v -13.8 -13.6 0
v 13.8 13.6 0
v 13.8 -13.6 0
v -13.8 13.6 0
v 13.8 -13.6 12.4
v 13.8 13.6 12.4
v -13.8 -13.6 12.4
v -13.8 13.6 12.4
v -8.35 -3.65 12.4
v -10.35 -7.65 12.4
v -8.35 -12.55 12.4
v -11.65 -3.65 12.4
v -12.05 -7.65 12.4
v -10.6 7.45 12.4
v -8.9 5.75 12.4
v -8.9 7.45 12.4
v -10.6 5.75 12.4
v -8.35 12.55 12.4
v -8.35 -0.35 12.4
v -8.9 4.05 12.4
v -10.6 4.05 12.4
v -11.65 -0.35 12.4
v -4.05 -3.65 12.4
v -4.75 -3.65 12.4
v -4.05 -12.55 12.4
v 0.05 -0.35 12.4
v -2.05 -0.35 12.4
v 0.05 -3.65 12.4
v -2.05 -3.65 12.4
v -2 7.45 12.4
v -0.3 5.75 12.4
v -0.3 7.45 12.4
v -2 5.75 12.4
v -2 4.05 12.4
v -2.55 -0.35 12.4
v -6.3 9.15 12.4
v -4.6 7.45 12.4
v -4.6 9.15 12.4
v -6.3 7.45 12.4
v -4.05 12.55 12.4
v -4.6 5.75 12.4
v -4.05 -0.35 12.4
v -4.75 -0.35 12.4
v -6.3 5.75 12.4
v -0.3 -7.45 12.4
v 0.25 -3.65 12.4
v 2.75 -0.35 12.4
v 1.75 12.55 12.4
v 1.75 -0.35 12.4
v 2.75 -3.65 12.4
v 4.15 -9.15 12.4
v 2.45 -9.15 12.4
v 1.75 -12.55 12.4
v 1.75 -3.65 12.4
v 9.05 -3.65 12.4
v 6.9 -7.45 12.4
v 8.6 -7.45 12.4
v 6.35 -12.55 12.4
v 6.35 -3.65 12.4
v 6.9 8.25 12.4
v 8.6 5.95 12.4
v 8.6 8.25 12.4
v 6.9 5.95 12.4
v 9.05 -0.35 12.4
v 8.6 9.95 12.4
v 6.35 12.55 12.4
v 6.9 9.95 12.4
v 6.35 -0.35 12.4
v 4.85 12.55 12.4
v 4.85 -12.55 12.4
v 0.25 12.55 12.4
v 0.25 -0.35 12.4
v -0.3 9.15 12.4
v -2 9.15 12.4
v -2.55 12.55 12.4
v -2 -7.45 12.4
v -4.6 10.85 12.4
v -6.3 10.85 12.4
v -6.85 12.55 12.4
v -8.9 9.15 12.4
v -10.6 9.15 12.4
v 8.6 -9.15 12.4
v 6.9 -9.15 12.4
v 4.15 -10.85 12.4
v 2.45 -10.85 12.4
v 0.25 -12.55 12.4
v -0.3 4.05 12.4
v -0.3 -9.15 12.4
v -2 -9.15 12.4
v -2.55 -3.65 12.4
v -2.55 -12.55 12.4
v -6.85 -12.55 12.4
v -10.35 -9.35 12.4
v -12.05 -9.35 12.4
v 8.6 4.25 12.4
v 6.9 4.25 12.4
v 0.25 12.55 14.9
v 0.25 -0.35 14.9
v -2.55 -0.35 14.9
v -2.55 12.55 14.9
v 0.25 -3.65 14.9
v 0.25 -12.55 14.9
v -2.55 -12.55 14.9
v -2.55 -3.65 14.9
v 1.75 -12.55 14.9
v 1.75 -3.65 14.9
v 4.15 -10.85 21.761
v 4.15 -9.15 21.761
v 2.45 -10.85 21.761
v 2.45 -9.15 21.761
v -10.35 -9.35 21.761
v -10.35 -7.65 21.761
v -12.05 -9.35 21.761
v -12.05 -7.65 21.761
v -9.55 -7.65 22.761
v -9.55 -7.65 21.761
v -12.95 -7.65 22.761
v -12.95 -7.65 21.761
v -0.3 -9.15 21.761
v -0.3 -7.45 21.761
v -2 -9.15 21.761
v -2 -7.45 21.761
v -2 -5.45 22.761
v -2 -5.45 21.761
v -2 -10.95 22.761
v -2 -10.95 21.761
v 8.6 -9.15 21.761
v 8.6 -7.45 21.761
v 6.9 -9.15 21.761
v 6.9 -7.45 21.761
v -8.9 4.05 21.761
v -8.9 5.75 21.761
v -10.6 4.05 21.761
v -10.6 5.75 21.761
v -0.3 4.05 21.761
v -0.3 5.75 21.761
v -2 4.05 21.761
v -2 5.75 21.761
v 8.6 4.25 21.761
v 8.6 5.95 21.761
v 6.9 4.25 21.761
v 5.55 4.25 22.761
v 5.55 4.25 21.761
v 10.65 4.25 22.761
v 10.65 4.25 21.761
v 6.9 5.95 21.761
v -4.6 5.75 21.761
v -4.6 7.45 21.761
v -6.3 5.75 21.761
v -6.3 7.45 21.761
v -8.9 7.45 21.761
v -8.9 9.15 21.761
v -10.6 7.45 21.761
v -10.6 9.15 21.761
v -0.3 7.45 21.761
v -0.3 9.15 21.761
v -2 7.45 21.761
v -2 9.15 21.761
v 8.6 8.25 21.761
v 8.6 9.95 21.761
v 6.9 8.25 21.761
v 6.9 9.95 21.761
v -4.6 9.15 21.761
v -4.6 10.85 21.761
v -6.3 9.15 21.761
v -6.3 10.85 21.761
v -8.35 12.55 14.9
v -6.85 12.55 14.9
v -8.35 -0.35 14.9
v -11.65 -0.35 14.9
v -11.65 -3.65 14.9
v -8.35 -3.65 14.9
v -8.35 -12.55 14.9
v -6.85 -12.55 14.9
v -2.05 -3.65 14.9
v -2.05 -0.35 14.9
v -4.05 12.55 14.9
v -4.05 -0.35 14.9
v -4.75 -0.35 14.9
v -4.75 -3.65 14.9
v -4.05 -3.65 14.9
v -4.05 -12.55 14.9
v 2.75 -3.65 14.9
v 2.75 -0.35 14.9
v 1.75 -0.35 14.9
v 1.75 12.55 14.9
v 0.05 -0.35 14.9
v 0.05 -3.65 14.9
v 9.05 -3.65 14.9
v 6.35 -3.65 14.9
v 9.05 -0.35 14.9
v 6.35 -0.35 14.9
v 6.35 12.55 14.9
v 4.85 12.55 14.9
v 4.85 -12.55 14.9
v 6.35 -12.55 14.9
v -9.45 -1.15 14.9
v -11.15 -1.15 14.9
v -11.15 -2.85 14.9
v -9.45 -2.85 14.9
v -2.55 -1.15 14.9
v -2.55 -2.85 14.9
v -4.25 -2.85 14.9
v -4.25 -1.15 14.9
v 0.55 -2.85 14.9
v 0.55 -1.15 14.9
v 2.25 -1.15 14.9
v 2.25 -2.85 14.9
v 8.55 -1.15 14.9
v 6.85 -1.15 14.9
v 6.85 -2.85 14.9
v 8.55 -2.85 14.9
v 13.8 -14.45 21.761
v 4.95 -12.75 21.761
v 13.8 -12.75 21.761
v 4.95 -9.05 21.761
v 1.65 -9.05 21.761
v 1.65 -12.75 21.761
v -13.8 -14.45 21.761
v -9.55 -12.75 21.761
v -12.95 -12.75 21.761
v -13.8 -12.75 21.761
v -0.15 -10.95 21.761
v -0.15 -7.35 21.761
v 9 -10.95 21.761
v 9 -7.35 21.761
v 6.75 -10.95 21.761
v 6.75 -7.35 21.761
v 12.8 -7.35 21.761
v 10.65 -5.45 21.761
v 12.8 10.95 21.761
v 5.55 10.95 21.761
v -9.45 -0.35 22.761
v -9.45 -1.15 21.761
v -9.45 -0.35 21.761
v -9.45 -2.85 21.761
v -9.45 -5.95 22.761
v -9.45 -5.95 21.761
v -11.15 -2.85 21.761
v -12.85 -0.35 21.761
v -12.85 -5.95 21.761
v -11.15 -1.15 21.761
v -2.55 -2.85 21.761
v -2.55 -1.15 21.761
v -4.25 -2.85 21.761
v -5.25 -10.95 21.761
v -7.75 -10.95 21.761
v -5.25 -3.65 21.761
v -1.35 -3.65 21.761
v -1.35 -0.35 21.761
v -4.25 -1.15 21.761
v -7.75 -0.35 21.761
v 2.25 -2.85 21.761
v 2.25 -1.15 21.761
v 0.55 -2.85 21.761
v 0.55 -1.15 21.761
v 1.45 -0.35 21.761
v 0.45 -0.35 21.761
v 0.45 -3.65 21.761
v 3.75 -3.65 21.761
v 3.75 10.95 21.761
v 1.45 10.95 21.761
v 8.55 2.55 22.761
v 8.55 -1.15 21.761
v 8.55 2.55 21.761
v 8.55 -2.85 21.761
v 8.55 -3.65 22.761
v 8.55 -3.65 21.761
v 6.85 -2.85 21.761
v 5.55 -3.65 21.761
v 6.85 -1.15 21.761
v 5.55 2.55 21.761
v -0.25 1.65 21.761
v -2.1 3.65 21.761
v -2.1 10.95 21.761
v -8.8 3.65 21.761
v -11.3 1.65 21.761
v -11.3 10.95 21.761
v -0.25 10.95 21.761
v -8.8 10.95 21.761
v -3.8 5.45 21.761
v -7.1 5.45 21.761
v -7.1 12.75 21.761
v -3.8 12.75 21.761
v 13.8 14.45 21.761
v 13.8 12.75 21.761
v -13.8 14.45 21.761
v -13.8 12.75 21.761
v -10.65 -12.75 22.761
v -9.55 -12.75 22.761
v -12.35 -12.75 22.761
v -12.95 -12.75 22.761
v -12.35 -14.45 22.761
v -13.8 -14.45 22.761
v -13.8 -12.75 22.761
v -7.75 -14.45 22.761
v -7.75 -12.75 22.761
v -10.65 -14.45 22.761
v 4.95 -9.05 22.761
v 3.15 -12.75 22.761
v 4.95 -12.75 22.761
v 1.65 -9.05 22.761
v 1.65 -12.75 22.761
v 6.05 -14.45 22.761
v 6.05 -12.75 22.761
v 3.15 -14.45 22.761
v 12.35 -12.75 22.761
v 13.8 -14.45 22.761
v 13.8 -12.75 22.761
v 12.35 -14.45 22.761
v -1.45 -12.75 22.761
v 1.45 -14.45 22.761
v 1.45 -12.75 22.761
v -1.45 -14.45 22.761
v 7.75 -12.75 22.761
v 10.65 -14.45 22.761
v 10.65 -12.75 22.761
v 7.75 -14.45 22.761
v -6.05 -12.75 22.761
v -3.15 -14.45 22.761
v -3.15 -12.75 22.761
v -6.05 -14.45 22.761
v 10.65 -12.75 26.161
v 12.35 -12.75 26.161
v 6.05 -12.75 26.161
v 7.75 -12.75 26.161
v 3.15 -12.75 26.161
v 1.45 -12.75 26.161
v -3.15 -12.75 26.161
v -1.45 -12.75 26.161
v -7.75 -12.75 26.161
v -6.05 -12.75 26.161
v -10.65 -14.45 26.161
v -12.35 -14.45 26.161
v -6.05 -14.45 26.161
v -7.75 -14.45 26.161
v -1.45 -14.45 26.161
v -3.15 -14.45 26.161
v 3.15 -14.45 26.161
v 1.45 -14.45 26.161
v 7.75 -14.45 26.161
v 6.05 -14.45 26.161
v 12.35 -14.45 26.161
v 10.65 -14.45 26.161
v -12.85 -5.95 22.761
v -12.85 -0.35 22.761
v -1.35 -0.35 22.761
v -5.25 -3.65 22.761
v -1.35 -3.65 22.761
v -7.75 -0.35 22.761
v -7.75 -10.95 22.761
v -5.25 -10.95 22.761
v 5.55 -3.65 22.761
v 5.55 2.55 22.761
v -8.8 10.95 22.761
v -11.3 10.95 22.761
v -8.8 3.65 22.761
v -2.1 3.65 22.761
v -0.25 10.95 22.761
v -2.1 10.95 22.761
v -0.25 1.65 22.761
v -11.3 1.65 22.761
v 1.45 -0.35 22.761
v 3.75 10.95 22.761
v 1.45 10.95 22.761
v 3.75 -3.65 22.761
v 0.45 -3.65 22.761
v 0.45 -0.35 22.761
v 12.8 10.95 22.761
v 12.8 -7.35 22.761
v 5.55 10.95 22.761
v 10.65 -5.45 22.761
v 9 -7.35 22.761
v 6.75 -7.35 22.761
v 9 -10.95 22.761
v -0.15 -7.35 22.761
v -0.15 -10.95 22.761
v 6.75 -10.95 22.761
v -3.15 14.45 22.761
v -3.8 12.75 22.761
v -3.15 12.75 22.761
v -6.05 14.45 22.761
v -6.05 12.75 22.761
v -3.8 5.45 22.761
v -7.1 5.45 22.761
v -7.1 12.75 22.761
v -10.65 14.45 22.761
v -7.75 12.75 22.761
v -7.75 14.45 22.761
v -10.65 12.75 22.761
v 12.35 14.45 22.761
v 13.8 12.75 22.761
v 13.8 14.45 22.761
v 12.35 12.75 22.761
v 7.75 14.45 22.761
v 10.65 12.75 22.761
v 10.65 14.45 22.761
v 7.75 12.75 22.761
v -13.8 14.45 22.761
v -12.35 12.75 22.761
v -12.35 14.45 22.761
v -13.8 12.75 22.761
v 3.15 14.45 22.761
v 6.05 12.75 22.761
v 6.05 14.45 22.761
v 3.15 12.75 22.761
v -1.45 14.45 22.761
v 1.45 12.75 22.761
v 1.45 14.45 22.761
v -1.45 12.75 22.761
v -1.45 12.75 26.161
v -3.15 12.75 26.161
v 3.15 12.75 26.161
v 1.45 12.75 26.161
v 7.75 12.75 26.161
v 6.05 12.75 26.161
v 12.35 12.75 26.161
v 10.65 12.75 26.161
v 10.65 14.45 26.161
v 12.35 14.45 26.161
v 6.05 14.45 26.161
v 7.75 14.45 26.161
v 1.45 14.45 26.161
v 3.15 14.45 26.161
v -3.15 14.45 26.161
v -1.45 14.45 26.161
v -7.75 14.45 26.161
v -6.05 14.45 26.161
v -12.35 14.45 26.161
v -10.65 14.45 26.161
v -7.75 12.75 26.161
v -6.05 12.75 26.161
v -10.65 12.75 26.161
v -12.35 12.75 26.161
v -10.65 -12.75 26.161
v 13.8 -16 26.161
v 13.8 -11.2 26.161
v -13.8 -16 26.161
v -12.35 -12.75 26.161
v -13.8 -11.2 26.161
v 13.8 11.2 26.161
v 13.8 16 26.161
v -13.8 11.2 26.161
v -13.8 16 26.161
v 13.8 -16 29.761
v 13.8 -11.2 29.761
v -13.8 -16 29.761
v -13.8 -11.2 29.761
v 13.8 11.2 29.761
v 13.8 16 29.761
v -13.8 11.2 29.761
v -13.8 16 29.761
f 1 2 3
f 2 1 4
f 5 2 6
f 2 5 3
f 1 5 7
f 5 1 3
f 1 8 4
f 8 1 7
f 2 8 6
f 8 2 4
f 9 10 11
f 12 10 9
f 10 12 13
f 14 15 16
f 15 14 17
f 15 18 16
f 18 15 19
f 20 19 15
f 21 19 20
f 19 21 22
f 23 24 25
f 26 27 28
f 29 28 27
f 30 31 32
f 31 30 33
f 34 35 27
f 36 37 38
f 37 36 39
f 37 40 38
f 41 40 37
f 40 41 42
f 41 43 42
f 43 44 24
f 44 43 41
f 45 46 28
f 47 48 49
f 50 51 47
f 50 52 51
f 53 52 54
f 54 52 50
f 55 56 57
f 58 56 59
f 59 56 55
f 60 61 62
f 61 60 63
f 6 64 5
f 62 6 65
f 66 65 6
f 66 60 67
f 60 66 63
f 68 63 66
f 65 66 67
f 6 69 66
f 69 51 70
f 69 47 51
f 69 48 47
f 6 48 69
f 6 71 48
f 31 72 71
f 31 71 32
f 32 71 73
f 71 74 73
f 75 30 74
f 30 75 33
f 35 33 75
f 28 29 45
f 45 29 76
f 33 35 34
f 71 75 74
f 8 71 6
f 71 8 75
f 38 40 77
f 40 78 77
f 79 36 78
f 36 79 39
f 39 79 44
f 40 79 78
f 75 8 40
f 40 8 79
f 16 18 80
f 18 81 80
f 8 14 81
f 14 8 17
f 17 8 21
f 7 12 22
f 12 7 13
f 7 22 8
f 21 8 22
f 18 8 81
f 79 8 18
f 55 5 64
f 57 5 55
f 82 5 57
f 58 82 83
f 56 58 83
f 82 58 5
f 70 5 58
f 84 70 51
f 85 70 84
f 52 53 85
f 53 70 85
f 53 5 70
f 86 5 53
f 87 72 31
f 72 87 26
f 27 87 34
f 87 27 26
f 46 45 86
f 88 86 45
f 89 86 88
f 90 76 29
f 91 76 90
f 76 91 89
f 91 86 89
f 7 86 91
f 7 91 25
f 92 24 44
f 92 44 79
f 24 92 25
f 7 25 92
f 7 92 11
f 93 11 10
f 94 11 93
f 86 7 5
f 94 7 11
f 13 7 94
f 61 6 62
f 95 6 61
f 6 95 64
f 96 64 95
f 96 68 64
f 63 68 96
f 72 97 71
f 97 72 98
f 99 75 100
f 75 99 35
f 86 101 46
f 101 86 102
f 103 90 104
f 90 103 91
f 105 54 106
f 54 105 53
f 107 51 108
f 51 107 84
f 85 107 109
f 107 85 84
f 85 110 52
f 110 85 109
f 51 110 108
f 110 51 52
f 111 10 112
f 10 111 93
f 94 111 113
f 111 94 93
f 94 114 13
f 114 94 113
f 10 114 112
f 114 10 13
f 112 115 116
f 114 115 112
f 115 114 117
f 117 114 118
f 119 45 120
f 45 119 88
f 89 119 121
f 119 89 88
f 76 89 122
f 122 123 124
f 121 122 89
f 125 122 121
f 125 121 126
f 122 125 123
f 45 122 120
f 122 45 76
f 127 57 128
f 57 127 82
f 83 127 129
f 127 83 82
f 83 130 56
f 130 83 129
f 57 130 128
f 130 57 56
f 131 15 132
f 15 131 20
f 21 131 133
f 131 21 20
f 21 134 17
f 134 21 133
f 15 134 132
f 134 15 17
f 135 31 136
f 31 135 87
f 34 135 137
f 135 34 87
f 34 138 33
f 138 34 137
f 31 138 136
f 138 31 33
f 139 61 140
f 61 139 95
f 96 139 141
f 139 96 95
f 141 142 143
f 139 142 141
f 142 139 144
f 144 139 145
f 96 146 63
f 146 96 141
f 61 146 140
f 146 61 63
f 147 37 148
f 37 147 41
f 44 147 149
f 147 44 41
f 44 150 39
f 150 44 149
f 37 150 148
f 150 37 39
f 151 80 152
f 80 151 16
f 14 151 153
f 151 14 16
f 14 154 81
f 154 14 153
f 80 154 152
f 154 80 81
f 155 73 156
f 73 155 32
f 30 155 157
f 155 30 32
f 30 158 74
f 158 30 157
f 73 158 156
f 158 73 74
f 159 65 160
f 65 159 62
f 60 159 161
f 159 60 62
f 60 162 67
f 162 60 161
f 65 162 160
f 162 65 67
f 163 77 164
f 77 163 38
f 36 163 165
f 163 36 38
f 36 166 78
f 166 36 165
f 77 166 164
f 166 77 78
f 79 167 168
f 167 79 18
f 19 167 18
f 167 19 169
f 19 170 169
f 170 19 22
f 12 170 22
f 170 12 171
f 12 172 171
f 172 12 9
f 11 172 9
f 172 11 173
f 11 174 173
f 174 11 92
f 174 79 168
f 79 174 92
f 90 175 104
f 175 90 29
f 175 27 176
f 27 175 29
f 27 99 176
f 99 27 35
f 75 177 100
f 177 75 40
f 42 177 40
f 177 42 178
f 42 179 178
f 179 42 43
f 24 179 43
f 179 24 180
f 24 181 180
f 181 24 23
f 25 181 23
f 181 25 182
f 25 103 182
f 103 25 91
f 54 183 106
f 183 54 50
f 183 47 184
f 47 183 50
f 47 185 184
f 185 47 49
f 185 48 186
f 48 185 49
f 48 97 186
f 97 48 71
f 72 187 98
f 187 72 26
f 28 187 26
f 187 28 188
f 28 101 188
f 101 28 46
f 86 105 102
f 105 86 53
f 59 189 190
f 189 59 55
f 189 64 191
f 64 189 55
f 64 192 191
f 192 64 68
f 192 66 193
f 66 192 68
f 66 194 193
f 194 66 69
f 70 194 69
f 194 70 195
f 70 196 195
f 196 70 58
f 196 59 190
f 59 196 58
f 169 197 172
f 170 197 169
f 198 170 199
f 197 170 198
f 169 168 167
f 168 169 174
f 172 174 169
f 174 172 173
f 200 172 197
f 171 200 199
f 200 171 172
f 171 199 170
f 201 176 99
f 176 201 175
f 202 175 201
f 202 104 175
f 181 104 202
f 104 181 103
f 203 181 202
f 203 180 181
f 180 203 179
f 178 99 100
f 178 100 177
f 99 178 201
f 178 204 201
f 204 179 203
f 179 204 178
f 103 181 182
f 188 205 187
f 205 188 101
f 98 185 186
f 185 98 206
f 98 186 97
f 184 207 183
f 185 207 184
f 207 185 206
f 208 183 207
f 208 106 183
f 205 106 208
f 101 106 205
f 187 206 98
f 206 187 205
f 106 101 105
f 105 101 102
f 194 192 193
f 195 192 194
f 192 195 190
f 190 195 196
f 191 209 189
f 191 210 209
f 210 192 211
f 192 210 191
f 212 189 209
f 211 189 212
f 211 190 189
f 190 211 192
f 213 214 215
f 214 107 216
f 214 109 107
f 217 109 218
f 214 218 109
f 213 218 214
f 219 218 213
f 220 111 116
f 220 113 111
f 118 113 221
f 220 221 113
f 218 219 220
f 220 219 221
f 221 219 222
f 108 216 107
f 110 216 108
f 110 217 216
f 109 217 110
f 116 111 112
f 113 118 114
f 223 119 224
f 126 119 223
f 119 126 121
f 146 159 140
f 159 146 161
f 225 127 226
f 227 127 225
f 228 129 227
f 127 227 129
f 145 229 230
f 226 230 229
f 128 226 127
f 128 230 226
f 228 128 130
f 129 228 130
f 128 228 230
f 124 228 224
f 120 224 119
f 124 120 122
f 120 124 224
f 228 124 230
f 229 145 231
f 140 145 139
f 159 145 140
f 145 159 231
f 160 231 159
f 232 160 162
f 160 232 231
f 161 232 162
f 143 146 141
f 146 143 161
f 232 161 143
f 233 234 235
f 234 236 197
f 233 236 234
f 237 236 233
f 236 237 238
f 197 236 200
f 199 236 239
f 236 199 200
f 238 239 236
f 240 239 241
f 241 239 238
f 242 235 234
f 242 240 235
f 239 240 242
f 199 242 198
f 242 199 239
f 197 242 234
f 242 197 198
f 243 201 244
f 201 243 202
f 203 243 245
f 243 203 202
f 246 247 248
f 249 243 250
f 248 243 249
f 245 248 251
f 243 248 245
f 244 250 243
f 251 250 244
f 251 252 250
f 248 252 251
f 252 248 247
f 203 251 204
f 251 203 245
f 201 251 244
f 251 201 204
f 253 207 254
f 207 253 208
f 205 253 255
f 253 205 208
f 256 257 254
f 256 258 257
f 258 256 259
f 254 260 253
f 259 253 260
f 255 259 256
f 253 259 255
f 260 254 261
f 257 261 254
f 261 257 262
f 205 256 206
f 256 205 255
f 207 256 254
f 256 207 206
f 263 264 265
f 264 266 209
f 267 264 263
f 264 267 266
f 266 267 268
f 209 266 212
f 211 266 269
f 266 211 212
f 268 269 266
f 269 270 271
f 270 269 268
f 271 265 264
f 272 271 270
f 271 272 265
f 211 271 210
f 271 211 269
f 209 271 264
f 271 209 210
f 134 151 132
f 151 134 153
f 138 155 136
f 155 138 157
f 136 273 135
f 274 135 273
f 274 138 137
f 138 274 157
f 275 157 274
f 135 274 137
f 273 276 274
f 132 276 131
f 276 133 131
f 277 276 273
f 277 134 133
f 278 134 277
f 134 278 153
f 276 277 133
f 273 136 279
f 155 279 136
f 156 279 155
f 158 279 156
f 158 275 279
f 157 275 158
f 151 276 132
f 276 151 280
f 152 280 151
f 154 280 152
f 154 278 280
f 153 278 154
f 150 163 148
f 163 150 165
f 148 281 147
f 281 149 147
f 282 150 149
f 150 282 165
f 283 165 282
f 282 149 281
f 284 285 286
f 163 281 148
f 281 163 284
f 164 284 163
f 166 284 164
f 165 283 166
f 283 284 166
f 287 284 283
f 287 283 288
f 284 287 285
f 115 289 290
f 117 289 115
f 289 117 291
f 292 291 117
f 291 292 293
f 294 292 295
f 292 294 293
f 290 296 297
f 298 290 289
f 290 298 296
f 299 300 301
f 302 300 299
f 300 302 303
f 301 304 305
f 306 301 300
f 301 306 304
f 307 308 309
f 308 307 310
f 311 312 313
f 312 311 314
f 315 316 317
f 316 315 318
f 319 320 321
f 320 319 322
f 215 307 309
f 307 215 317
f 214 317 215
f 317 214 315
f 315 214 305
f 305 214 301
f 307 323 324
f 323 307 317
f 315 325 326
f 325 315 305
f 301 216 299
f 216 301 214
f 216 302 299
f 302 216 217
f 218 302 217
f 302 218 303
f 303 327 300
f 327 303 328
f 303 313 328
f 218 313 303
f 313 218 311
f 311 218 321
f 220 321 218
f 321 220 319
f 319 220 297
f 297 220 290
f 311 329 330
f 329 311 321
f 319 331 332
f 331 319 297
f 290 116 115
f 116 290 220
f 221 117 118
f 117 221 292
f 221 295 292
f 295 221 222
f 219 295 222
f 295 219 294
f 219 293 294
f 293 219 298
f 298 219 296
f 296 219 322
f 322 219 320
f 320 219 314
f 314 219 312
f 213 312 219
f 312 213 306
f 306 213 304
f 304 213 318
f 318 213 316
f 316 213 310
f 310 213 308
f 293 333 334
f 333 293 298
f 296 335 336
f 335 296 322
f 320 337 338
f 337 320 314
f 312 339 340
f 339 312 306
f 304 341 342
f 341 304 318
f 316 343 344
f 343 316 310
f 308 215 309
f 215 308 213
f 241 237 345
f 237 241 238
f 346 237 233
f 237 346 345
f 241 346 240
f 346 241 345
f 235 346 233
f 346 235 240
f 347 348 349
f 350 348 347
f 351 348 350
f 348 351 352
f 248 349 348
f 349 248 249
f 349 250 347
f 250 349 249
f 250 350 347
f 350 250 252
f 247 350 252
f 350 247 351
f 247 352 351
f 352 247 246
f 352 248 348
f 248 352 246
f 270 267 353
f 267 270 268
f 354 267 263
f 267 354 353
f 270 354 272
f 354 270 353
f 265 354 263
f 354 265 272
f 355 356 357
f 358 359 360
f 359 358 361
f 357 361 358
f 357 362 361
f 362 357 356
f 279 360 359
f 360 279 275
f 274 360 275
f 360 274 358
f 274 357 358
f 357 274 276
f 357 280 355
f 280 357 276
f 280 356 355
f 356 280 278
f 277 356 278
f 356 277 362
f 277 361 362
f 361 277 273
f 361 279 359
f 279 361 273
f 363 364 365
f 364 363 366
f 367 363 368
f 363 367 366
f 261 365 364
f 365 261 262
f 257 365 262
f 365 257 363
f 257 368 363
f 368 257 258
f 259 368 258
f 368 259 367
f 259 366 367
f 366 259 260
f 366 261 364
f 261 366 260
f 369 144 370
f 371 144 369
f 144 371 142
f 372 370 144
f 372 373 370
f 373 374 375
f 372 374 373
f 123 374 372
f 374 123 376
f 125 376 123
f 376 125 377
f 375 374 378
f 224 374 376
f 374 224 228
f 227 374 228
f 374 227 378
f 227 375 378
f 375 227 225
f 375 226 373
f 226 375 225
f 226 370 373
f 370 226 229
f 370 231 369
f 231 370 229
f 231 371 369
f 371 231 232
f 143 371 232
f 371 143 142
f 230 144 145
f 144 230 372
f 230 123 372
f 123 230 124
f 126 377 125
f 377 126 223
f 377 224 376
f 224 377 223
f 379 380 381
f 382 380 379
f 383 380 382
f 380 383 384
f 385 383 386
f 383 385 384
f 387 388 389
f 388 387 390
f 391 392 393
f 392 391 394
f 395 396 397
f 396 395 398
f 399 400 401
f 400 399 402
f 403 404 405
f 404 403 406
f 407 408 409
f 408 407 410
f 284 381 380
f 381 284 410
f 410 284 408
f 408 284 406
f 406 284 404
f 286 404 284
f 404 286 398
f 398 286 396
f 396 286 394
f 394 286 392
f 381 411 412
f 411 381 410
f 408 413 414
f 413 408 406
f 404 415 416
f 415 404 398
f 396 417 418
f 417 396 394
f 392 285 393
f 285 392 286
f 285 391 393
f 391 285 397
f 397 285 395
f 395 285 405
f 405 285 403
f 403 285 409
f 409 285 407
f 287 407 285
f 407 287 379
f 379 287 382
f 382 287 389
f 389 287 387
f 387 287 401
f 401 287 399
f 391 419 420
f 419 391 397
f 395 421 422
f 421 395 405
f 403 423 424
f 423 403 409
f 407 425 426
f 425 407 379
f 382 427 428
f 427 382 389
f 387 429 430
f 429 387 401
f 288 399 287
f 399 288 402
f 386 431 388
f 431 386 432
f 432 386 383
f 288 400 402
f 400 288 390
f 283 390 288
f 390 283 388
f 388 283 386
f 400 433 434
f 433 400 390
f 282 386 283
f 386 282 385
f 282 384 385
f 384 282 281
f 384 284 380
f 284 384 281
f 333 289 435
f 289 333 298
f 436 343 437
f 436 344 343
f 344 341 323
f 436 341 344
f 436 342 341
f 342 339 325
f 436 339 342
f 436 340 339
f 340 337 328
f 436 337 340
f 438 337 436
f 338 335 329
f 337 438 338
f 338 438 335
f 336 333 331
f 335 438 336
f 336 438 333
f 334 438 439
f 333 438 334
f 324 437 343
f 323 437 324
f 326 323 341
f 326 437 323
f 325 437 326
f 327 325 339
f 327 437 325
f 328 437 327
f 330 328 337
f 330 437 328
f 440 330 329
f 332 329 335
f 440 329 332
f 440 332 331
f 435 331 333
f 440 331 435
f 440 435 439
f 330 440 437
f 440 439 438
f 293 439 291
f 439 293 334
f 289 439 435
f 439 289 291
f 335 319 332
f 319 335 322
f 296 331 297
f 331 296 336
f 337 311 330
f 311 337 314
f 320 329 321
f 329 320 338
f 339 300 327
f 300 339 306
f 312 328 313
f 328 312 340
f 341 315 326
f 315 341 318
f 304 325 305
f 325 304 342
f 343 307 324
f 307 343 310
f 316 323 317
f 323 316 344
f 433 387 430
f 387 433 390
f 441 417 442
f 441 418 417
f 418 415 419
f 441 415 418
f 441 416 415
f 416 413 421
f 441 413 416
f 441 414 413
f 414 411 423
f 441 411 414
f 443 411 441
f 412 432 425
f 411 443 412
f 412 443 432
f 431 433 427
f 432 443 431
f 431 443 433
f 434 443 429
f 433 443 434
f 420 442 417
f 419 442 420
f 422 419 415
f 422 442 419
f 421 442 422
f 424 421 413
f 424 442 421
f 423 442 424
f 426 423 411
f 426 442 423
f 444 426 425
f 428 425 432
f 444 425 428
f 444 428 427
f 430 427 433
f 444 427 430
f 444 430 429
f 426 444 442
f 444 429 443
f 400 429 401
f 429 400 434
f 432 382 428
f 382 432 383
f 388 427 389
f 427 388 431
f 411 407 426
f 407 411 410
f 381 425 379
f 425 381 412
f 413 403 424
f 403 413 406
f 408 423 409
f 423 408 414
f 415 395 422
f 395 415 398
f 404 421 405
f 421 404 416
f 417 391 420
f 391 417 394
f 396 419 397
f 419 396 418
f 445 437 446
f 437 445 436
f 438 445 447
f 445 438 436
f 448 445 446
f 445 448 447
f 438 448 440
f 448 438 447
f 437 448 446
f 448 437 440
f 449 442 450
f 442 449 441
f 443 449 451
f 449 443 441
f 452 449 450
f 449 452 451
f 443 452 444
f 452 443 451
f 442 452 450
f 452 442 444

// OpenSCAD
// Generated by SolidPython 0.4.2 on 2020-09-29 23:19:38
//!OpenSCAD

scale(v = 0.0100000000) {
	translate(v = [-1380, -1360, 0]) {
		union() {
			color(c = [0.4000000000, 0.4000000000, 0.4000000000]) {
				translate(v = [0, 0, 0]) {
					linear_extrude(height = 1000.0000000000) {
						polygon(paths = [[0, 1, 2, 3]], points = [[0, 0], [0, 2720], [2760, 2720], [2760, 0]]);
					}
				}
			}
			color(c = [0.2000000000, 0.6000000000, 0.2000000000]) {
				translate(v = [0, 0, 1000.0000000000]) {
					linear_extrude(height = 120.0000000000) {
						polygon(paths = [[0, 1, 2, 3]], points = [[0, 1305], [0, 2720], [2760, 2720], [2760, 1305]]);
					}
				}
			}
			color(c = [0.4000000000, 0.4000000000, 0.4000000000]) {
				translate(v = [0, 0, 1000.0000000000]) {
					linear_extrude(height = 120.0000000000) {
						polygon(paths = [[0, 1, 2, 3]], points = [[0, 0], [0, 1305], [2760, 1305], [2760, 0]]);
					}
				}
			}
			color(c = [0.9000000000, 0.6000000000, 0.6000000000]) {
				translate(v = [0, 0, 1120.0000000000]) {
					linear_extrude(height = 120.0000000000) {
						polygon(paths = [[0, 1, 2, 3]], points = [[280, 1485], [280, 2485], [545, 2485], [545, 1485]]);
					}
				}
			}
			color(c = [0.9000000000, 0.6000000000, 0.6000000000]) {
				translate(v = [0, 0, 1120.0000000000]) {
					linear_extrude(height = 120.0000000000) {
						polygon(paths = [[0, 1, 2, 3]], points = [[695, 1485], [695, 2485], [975, 2485], [975, 1485]]);
					}
				}
			}
			color(c = [0.9000000000, 0.6000000000, 0.6000000000]) {
				translate(v = [0, 0, 1120.0000000000]) {
					linear_extrude(height = 120.0000000000) {
						polygon(paths = [[0, 1, 2, 3]], points = [[1125, 1485], [1125, 2485], [1405, 2485], [1405, 1485]]);
					}
				}
			}
			color(c = [0.9000000000, 0.6000000000, 0.6000000000]) {
				translate(v = [0, 0, 1120.0000000000]) {
					linear_extrude(height = 120.0000000000) {
						polygon(paths = [[0, 1, 2, 3]], points = [[1555, 1485], [1555, 2485], [1865, 2485], [1865, 1485]]);
					}
				}
			}
			color(c = [0.9000000000, 0.6000000000, 0.6000000000]) {
				translate(v = [0, 0, 1120.0000000000]) {
					linear_extrude(height = 120.0000000000) {
						polygon(paths = [[0, 1, 2, 3]], points = [[2015, 1485], [2015, 2485], [2280, 2485], [2280, 1485]]);
					}
				}
			}
			color(c = [0.9000000000, 0.6000000000, 0.9000000000]) {
				translate(v = [0, 0, 1120.0000000000]) {
					linear_extrude(height = 120.0000000000) {
						polygon(paths = [[0, 1, 2, 3]], points = [[135, 235], [135, 885], [545, 885], [545, 235]]);
					}
				}
			}
			color(c = [0.9000000000, 0.6000000000, 0.9000000000]) {
				translate(v = [0, 0, 1120.0000000000]) {
					linear_extrude(height = 120.0000000000) {
						polygon(paths = [[0, 1, 2, 3]], points = [[695, 235], [695, 885], [975, 885], [975, 235]]);
					}
				}
			}
			color(c = [0.9000000000, 0.6000000000, 0.9000000000]) {
				translate(v = [0, 0, 1120.0000000000]) {
					linear_extrude(height = 120.0000000000) {
						polygon(paths = [[0, 1, 2, 3]], points = [[1125, 235], [1125, 885], [1405, 885], [1405, 235]]);
					}
				}
			}
			color(c = [0.9000000000, 0.6000000000, 0.9000000000]) {
				translate(v = [0, 0, 1120.0000000000]) {
					linear_extrude(height = 120.0000000000) {
						polygon(paths = [[0, 1, 2, 3]], points = [[1555, 235], [1555, 885], [1865, 885], [1865, 235]]);
					}
				}
			}
			color(c = [0.9000000000, 0.6000000000, 0.9000000000]) {
				translate(v = [0, 0, 1120.0000000000]) {
					linear_extrude(height = 120.0000000000) {
						polygon(paths = [[0, 1, 2, 3]], points = [[2015, 235], [2015, 885], [2280, 885], [2280, 235]]);
					}
				}
			}
			color(c = [0.2000000000, 0.6000000000, 0.2000000000]) {
				translate(v = [0, 0, 1120.0000000000]) {
					linear_extrude(height = 120.0000000000) {
						difference() {
							polygon(paths = [[0, 1, 2, 3]], points = [[0, 1305], [0, 2720], [2760, 2720], [2760, 1305]]);
							polygon(paths = [[0, 1, 2, 3]], points = [[280, 1485], [545, 1485], [545, 2485], [280, 2485]]);
							polygon(paths = [[0, 1, 2, 3]], points = [[695, 1485], [975, 1485], [975, 2485], [695, 2485]]);
							polygon(paths = [[0, 1, 2, 3]], points = [[1125, 1485], [1405, 1485], [1405, 2485], [1125, 2485]]);
							polygon(paths = [[0, 1, 2, 3]], points = [[1555, 1485], [1865, 1485], [1865, 2485], [1555, 2485]]);
							polygon(paths = [[0, 1, 2, 3]], points = [[2015, 1485], [2280, 1485], [2280, 2485], [2015, 2485]]);
						}
					}
				}
			}
			color(c = [0.4000000000, 0.4000000000, 0.4000000000]) {
				translate(v = [0, 0, 1120.0000000000]) {
					linear_extrude(height = 120.0000000000) {
						difference() {
							polygon(paths = [[0, 1, 2, 3]], points = [[0, 0], [0, 1305], [2760, 1305], [2760, 0]]);
							polygon(paths = [[0, 1, 2, 3]], points = [[135, 235], [545, 235], [545, 885], [135, 885]]);
							polygon(paths = [[0, 1, 2, 3]], points = [[695, 235], [975, 235], [975, 885], [695, 885]]);
							polygon(paths = [[0, 1, 2, 3]], points = [[1125, 235], [1405, 235], [1405, 885], [1125, 885]]);
							polygon(paths = [[0, 1, 2, 3]], points = [[1555, 235], [1865, 235], [1865, 885], [1555, 885]]);
							polygon(paths = [[0, 1, 2, 3]], points = [[2015, 235], [2280, 235], [2280, 885], [2015, 885]]);
						}
					}
				}
			}
			color(c = [0.1000000000, 0.1000000000, 0.1000000000]) {
				translate(v = [0, 0, 1240.0000000000]) {
					linear_extrude(height = 70.0000000000) {
						polygon(paths = [[0, 1, 2, 3]], points = [[1625, 275], [1625, 445], [1795, 445], [1795, 275]]);
					}
				}
			}
			color(c = [0.1000000000, 0.1000000000, 0.1000000000]) {
				translate(v = [0, 0, 1240.0000000000]) {
					linear_extrude(height = 70.0000000000) {
						polygon(paths = [[0, 1, 2, 3]], points = [[175, 425], [175, 595], [345, 595], [345, 425]]);
					}
				}
			}
			color(c = [0.1000000000, 0.1000000000, 0.1000000000]) {
				translate(v = [0, 0, 1240.0000000000]) {
					linear_extrude(height = 70.0000000000) {
						polygon(paths = [[0, 1, 2, 3]], points = [[1180, 445], [1180, 615], [1350, 615], [1350, 445]]);
					}
				}
			}
			color(c = [0.1000000000, 0.1000000000, 0.1000000000]) {
				translate(v = [0, 0, 1240.0000000000]) {
					linear_extrude(height = 70.0000000000) {
						polygon(paths = [[0, 1, 2, 3]], points = [[2070, 445], [2070, 615], [2240, 615], [2240, 445]]);
					}
				}
			}
			color(c = [0.1000000000, 0.1000000000, 0.1000000000]) {
				translate(v = [0, 0, 1240.0000000000]) {
					linear_extrude(height = 70.0000000000) {
						polygon(paths = [[0, 1, 2, 3]], points = [[320, 1765], [320, 1935], [490, 1935], [490, 1765]]);
					}
				}
			}
			color(c = [0.1000000000, 0.1000000000, 0.1000000000]) {
				translate(v = [0, 0, 1240.0000000000]) {
					linear_extrude(height = 70.0000000000) {
						polygon(paths = [[0, 1, 2, 3]], points = [[1180, 1765], [1180, 1935], [1350, 1935], [1350, 1765]]);
					}
				}
			}
			color(c = [0.1000000000, 0.1000000000, 0.1000000000]) {
				translate(v = [0, 0, 1240.0000000000]) {
					linear_extrude(height = 70.0000000000) {
						polygon(paths = [[0, 1, 2, 3]], points = [[2070, 1785], [2070, 1955], [2240, 1955], [2240, 1785]]);
					}
				}
			}
			color(c = [0.1000000000, 0.1000000000, 0.1000000000]) {
				translate(v = [0, 0, 1240.0000000000]) {
					linear_extrude(height = 70.0000000000) {
						polygon(paths = [[0, 1, 2, 3]], points = [[750, 1935], [750, 2105], [920, 2105], [920, 1935]]);
					}
				}
			}
			color(c = [0.1000000000, 0.1000000000, 0.1000000000]) {
				translate(v = [0, 0, 1240.0000000000]) {
					linear_extrude(height = 70.0000000000) {
						polygon(paths = [[0, 1, 2, 3]], points = [[320, 2105], [320, 2275], [490, 2275], [490, 2105]]);
					}
				}
			}
			color(c = [0.1000000000, 0.1000000000, 0.1000000000]) {
				translate(v = [0, 0, 1240.0000000000]) {
					linear_extrude(height = 70.0000000000) {
						polygon(paths = [[0, 1, 2, 3]], points = [[1180, 2105], [1180, 2275], [1350, 2275], [1350, 2105]]);
					}
				}
			}
			color(c = [0.1000000000, 0.1000000000, 0.1000000000]) {
				translate(v = [0, 0, 1240.0000000000]) {
					linear_extrude(height = 70.0000000000) {
						polygon(paths = [[0, 1, 2, 3]], points = [[2070, 2185], [2070, 2355], [2240, 2355], [2240, 2185]]);
					}
				}
			}
			color(c = [0.1000000000, 0.1000000000, 0.1000000000]) {
				translate(v = [0, 0, 1240.0000000000]) {
					linear_extrude(height = 70.0000000000) {
						polygon(paths = [[0, 1, 2, 3]], points = [[750, 2275], [750, 2445], [920, 2445], [920, 2275]]);
					}
				}
			}
			color(c = [1.0000000000, 1.0000000000, 1.0000000000]) {
				translate(v = [0, 0, 1240.0000000000]) {
					linear_extrude(height = 70.0000000000) {
						polygon(paths = [[0, 1, 2, 3, 4, 5, 6, 7]], points = [[545, 105], [545, 995], [215, 995], [215, 1325], [545, 1325], [545, 2615], [695, 2615], [695, 105]]);
					}
				}
			}
			color(c = [1.0000000000, 1.0000000000, 1.0000000000]) {
				translate(v = [0, 0, 1240.0000000000]) {
					linear_extrude(height = 70.0000000000) {
						polygon(paths = [[0, 1, 2, 3, 4, 5, 6, 7, 8, 9, 10, 11]], points = [[975, 105], [975, 995], [905, 995], [905, 1325], [975, 1325], [975, 2615], [1125, 2615], [1125, 1325], [1175, 1325], [1175, 995], [1125, 995], [1125, 105]]);
					}
				}
			}
			color(c = [1.0000000000, 1.0000000000, 1.0000000000]) {
				translate(v = [0, 0, 1240.0000000000]) {
					linear_extrude(height = 70.0000000000) {
						polygon(paths = [[0, 1, 2, 3, 4, 5, 6, 7, 8, 9, 10, 11]], points = [[1405, 105], [1405, 995], [1385, 995], [1385, 1325], [1405, 1325], [1405, 2615], [1555, 2615], [1555, 1325], [1655, 1325], [1655, 995], [1555, 995], [1555, 105]]);
					}
				}
			}
			color(c = [1.0000000000, 1.0000000000, 1.0000000000]) {
				translate(v = [0, 0, 1240.0000000000]) {
					linear_extrude(height = 70.0000000000) {
						polygon(paths = [[0, 1, 2, 3, 4, 5, 6, 7]], points = [[1865, 105], [1865, 2615], [2015, 2615], [2015, 1325], [2285, 1325], [2285, 995], [2015, 995], [2015, 105]]);
					}
				}
			}
			color(c = [0.1000000000, 0.1000000000, 0.1000000000]) {
				translate(v = [0, 0, 1310.0000000000]) {
					linear_extrude(height = 180.0000000000) {
						polygon(paths = [[0, 1, 2, 3]], points = [[1625, 275], [1625, 445], [1795, 445], [1795, 275]]);
					}
				}
			}
			color(c = [0.1000000000, 0.1000000000, 0.1000000000]) {
				translate(v = [0, 0, 1310.0000000000]) {
					linear_extrude(height = 180.0000000000) {
						polygon(paths = [[0, 1, 2, 3]], points = [[175, 425], [175, 595], [345, 595], [345, 425]]);
					}
				}
			}
			color(c = [0.1000000000, 0.1000000000, 0.1000000000]) {
				translate(v = [0, 0, 1310.0000000000]) {
					linear_extrude(height = 180.0000000000) {
						polygon(paths = [[0, 1, 2, 3]], points = [[1180, 445], [1180, 615], [1350, 615], [1350, 445]]);
					}
				}
			}
			color(c = [0.1000000000, 0.1000000000, 0.1000000000]) {
				translate(v = [0, 0, 1310.0000000000]) {
					linear_extrude(height = 180.0000000000) {
						polygon(paths = [[0, 1, 2, 3]], points = [[2070, 445], [2070, 615], [2240, 615], [2240, 445]]);
					}
				}
			}
			color(c = [0.1000000000, 0.1000000000, 0.1000000000]) {
				translate(v = [0, 0, 1310.0000000000]) {
					linear_extrude(height = 180.0000000000) {
						polygon(paths = [[0, 1, 2, 3]], points = [[320, 1765], [320, 1935], [490, 1935], [490, 1765]]);
					}
				}
			}
			color(c = [0.1000000000, 0.1000000000, 0.1000000000]) {
				translate(v = [0, 0, 1310.0000000000]) {
					linear_extrude(height = 180.0000000000) {
						polygon(paths = [[0, 1, 2, 3]], points = [[1180, 1765], [1180, 1935], [1350, 1935], [1350, 1765]]);
					}
				}
			}
			color(c = [0.1000000000, 0.1000000000, 0.1000000000]) {
				translate(v = [0, 0, 1310.0000000000]) {
					linear_extrude(height = 180.0000000000) {
						polygon(paths = [[0, 1, 2, 3]], points = [[2070, 1785], [2070, 1955], [2240, 1955], [2240, 1785]]);
					}
				}
			}
			color(c = [0.1000000000, 0.1000000000, 0.1000000000]) {
				translate(v = [0, 0, 1310.0000000000]) {
					linear_extrude(height = 180.0000000000) {
						polygon(paths = [[0, 1, 2, 3]], points = [[750, 1935], [750, 2105], [920, 2105], [920, 1935]]);
					}
				}
			}
			color(c = [0.1000000000, 0.1000000000, 0.1000000000]) {
				translate(v = [0, 0, 1310.0000000000]) {
					linear_extrude(height = 180.0000000000) {
						polygon(paths = [[0, 1, 2, 3]], points = [[320, 2105], [320, 2275], [490, 2275], [490, 2105]]);
					}
				}
			}
			color(c = [0.1000000000, 0.1000000000, 0.1000000000]) {
				translate(v = [0, 0, 1310.0000000000]) {
					linear_extrude(height = 180.0000000000) {
						polygon(paths = [[0, 1, 2, 3]], points = [[1180, 2105], [1180, 2275], [1350, 2275], [1350, 2105]]);
					}
				}
			}
			color(c = [0.1000000000, 0.1000000000, 0.1000000000]) {
				translate(v = [0, 0, 1310.0000000000]) {
					linear_extrude(height = 180.0000000000) {
						polygon(paths = [[0, 1, 2, 3]], points = [[2070, 2185], [2070, 2355], [2240, 2355], [2240, 2185]]);
					}
				}
			}
			color(c = [0.1000000000, 0.1000000000, 0.1000000000]) {
				translate(v = [0, 0, 1310.0000000000]) {
					linear_extrude(height = 180.0000000000) {
						polygon(paths = [[0, 1, 2, 3]], points = [[750, 2275], [750, 2445], [920, 2445], [920, 2275]]);
					}
				}
			}
			color(c = [0.7000000000, 0, 0]) {
				translate(v = [0, 0, 1310.0000000000]) {
					linear_extrude(height = 180.0000000000) {
						polygon(paths = [[0, 1, 2, 3, 4, 5, 6, 7]], points = [[545, 105], [545, 995], [215, 995], [215, 1325], [545, 1325], [545, 2615], [695, 2615], [695, 105]]);
					}
				}
			}
			color(c = [0.7000000000, 0, 0]) {
				translate(v = [0, 0, 1310.0000000000]) {
					linear_extrude(height = 180.0000000000) {
						polygon(paths = [[0, 1, 2, 3, 4, 5, 6, 7, 8, 9, 10, 11]], points = [[975, 105], [975, 995], [905, 995], [905, 1325], [975, 1325], [975, 2615], [1125, 2615], [1125, 1325], [1175, 1325], [1175, 995], [1125, 995], [1125, 105]]);
					}
				}
			}
			color(c = [0.7000000000, 0, 0]) {
				translate(v = [0, 0, 1310.0000000000]) {
					linear_extrude(height = 180.0000000000) {
						polygon(paths = [[0, 1, 2, 3, 4, 5, 6, 7, 8, 9, 10, 11]], points = [[1405, 105], [1405, 995], [1385, 995], [1385, 1325], [1405, 1325], [1405, 2615], [1555, 2615], [1555, 1325], [1655, 1325], [1655, 995], [1555, 995], [1555, 105]]);
					}
				}
			}
			color(c = [0.7000000000, 0, 0]) {
				translate(v = [0, 0, 1310.0000000000]) {
					linear_extrude(height = 180.0000000000) {
						polygon(paths = [[0, 1, 2, 3, 4, 5, 6, 7]], points = [[1865, 105], [1865, 2615], [2015, 2615], [2015, 1325], [2285, 1325], [2285, 995], [2015, 995], [2015, 105]]);
					}
				}
			}
			color(c = [0.1000000000, 0.1000000000, 0.1000000000]) {
				translate(v = [0, 0, 1490.0000000000]) {
					linear_extrude(height = 686.1000000000) {
						polygon(paths = [[0, 1, 2, 3]], points = [[1625, 275], [1625, 445], [1795, 445], [1795, 275]]);
					}
				}
			}
			color(c = [0.1000000000, 0.1000000000, 0.1000000000]) {
				translate(v = [0, 0, 1490.0000000000]) {
					linear_extrude(height = 686.1000000000) {
						polygon(paths = [[0, 1, 2, 3]], points = [[175, 425], [175, 595], [345, 595], [345, 425]]);
					}
				}
			}
			color(c = [0.1000000000, 0.1000000000, 0.1000000000]) {
				translate(v = [0, 0, 1490.0000000000]) {
					linear_extrude(height = 686.1000000000) {
						polygon(paths = [[0, 1, 2, 3]], points = [[1180, 445], [1180, 615], [1350, 615], [1350, 445]]);
					}
				}
			}
			color(c = [0.1000000000, 0.1000000000, 0.1000000000]) {
				translate(v = [0, 0, 1490.0000000000]) {
					linear_extrude(height = 686.1000000000) {
						polygon(paths = [[0, 1, 2, 3]], points = [[2070, 445], [2070, 615], [2240, 615], [2240, 445]]);
					}
				}
			}
			color(c = [0.1000000000, 0.1000000000, 0.1000000000]) {
				translate(v = [0, 0, 1490.0000000000]) {
					linear_extrude(height = 686.1000000000) {
						polygon(paths = [[0, 1, 2, 3]], points = [[265, 1075], [265, 1245], [435, 1245], [435, 1075]]);
					}
				}
			}
			color(c = [0.1000000000, 0.1000000000, 0.1000000000]) {
				translate(v = [0, 0, 1490.0000000000]) {
					linear_extrude(height = 686.1000000000) {
						polygon(paths = [[0, 1, 2, 3]], points = [[955, 1075], [955, 1245], [1125, 1245], [1125, 1075]]);
					}
				}
			}
			color(c = [0.1000000000, 0.1000000000, 0.1000000000]) {
				translate(v = [0, 0, 1490.0000000000]) {
					linear_extrude(height = 686.1000000000) {
						polygon(paths = [[0, 1, 2, 3]], points = [[1435, 1075], [1435, 1245], [1605, 1245], [1605, 1075]]);
					}
				}
			}
			color(c = [0.1000000000, 0.1000000000, 0.1000000000]) {
				translate(v = [0, 0, 1490.0000000000]) {
					linear_extrude(height = 686.1000000000) {
						polygon(paths = [[0, 1, 2, 3]], points = [[2065, 1075], [2065, 1245], [2235, 1245], [2235, 1075]]);
					}
				}
			}
			color(c = [0.1000000000, 0.1000000000, 0.1000000000]) {
				translate(v = [0, 0, 1490.0000000000]) {
					linear_extrude(height = 686.1000000000) {
						polygon(paths = [[0, 1, 2, 3]], points = [[320, 1765], [320, 1935], [490, 1935], [490, 1765]]);
					}
				}
			}
			color(c = [0.1000000000, 0.1000000000, 0.1000000000]) {
				translate(v = [0, 0, 1490.0000000000]) {
					linear_extrude(height = 686.1000000000) {
						polygon(paths = [[0, 1, 2, 3]], points = [[1180, 1765], [1180, 1935], [1350, 1935], [1350, 1765]]);
					}
				}
			}
			color(c = [0.1000000000, 0.1000000000, 0.1000000000]) {
				translate(v = [0, 0, 1490.0000000000]) {
					linear_extrude(height = 686.1000000000) {
						polygon(paths = [[0, 1, 2, 3]], points = [[2070, 1785], [2070, 1955], [2240, 1955], [2240, 1785]]);
					}
				}
			}
			color(c = [0.1000000000, 0.1000000000, 0.1000000000]) {
				translate(v = [0, 0, 1490.0000000000]) {
					linear_extrude(height = 686.1000000000) {
						polygon(paths = [[0, 1, 2, 3]], points = [[750, 1935], [750, 2105], [920, 2105], [920, 1935]]);
					}
				}
			}
			color(c = [0.1000000000, 0.1000000000, 0.1000000000]) {
				translate(v = [0, 0, 1490.0000000000]) {
					linear_extrude(height = 686.1000000000) {
						polygon(paths = [[0, 1, 2, 3]], points = [[320, 2105], [320, 2275], [490, 2275], [490, 2105]]);
					}
				}
			}
			color(c = [0.1000000000, 0.1000000000, 0.1000000000]) {
				translate(v = [0, 0, 1490.0000000000]) {
					linear_extrude(height = 686.1000000000) {
						polygon(paths = [[0, 1, 2, 3]], points = [[1180, 2105], [1180, 2275], [1350, 2275], [1350, 2105]]);
					}
				}
			}
			color(c = [0.1000000000, 0.1000000000, 0.1000000000]) {
				translate(v = [0, 0, 1490.0000000000]) {
					linear_extrude(height = 686.1000000000) {
						polygon(paths = [[0, 1, 2, 3]], points = [[2070, 2185], [2070, 2355], [2240, 2355], [2240, 2185]]);
					}
				}
			}
			color(c = [0.1000000000, 0.1000000000, 0.1000000000]) {
				translate(v = [0, 0, 1490.0000000000]) {
					linear_extrude(height = 686.1000000000) {
						polygon(paths = [[0, 1, 2, 3]], points = [[750, 2275], [750, 2445], [920, 2445], [920, 2275]]);
					}
				}
			}
			color(c = [0.9000000000, 0.6000000000, 0.6000000000]) {
				translate(v = [0, 0, 2176.1000000000]) {
					linear_extrude(height = 100.0000000000) {
						polygon(paths = [[0, 1, 2, 3, 4, 5, 6, 7, 8, 9, 10, 11]], points = [[0, -85], [0, 85], [85, 85], [85, 595], [425, 595], [425, 85], [1545, 85], [1545, 455], [1875, 455], [1875, 85], [2760, 85], [2760, -85]]);
					}
				}
			}
			color(c = [0.9000000000, 0.6000000000, 0.6000000000]) {
				translate(v = [0, 0, 2176.1000000000]) {
					linear_extrude(height = 100.0000000000) {
						polygon(paths = [[0, 1, 2, 3]], points = [[95, 765], [95, 1325], [435, 1325], [435, 765]]);
					}
				}
			}
			color(c = [0.9000000000, 0.6000000000, 0.6000000000]) {
				translate(v = [0, 0, 2176.1000000000]) {
					linear_extrude(height = 100.0000000000) {
						polygon(paths = [[0, 1, 2, 3, 4, 5]], points = [[605, 265], [605, 1325], [1245, 1325], [1245, 995], [855, 995], [855, 265]]);
					}
				}
			}
			color(c = [0.9000000000, 0.6000000000, 0.6000000000]) {
				translate(v = [0, 0, 2176.1000000000]) {
					linear_extrude(height = 100.0000000000) {
						polygon(paths = [[0, 1, 2, 3]], points = [[1935, 995], [1935, 1615], [2235, 1615], [2235, 995]]);
					}
				}
			}
			color(c = [0.9000000000, 0.6000000000, 0.6000000000]) {
				translate(v = [0, 0, 2176.1000000000]) {
					linear_extrude(height = 100.0000000000) {
						polygon(paths = [[0, 1, 2, 3, 4, 5, 6, 7]], points = [[250, 1525], [250, 2455], [500, 2455], [500, 1725], [1170, 1725], [1170, 2455], [1355, 2455], [1355, 1525]]);
					}
				}
			}
			color(c = [0.9000000000, 0.6000000000, 0.6000000000]) {
				translate(v = [0, 0, 2176.1000000000]) {
					linear_extrude(height = 100.0000000000) {
						polygon(paths = [[0, 1, 2, 3, 4, 5]], points = [[1425, 995], [1425, 1325], [1525, 1325], [1525, 2455], [1755, 2455], [1755, 995]]);
					}
				}
			}
			color(c = [0.9000000000, 0.6000000000, 0.6000000000]) {
				translate(v = [0, 0, 2176.1000000000]) {
					linear_extrude(height = 100.0000000000) {
						polygon(paths = [[0, 1, 2, 3, 4, 5, 6, 7, 8, 9, 10, 11, 12, 13]], points = [[1180, 265], [1180, 815], [2445, 815], [2445, 1785], [1935, 1785], [1935, 2455], [2660, 2455], [2660, 625], [2280, 625], [2280, 265], [2055, 265], [2055, 625], [1365, 625], [1365, 265]]);
					}
				}
			}
			color(c = [0.9000000000, 0.6000000000, 0.6000000000]) {
				translate(v = [0, 0, 2176.1000000000]) {
					linear_extrude(height = 100.0000000000) {
						polygon(paths = [[0, 1, 2, 3, 4, 5, 6, 7]], points = [[670, 1905], [670, 2635], [0, 2635], [0, 2805], [2760, 2805], [2760, 2635], [1000, 2635], [1000, 1905]]);
					}
				}
			}
			color(c = [0.5000000000, 0.5000000000, 0.5000000000]) {
				translate(v = [0, 0, 2276.1000000000]) {
					linear_extrude(height = 340.0000000000) {
						polygon(paths = [[0, 1, 2, 3]], points = [[145, -85], [145, 85], [315, 85], [315, -85]]);
					}
				}
			}
			color(c = [0.5000000000, 0.5000000000, 0.5000000000]) {
				translate(v = [0, 0, 2276.1000000000]) {
					linear_extrude(height = 340.0000000000) {
						polygon(paths = [[0, 1, 2, 3]], points = [[605, -85], [605, 85], [775, 85], [775, -85]]);
					}
				}
			}
			color(c = [0.5000000000, 0.5000000000, 0.5000000000]) {
				translate(v = [0, 0, 2276.1000000000]) {
					linear_extrude(height = 340.0000000000) {
						polygon(paths = [[0, 1, 2, 3]], points = [[1065, -85], [1065, 85], [1235, 85], [1235, -85]]);
					}
				}
			}
			color(c = [0.5000000000, 0.5000000000, 0.5000000000]) {
				translate(v = [0, 0, 2276.1000000000]) {
					linear_extrude(height = 340.0000000000) {
						polygon(paths = [[0, 1, 2, 3]], points = [[1525, -85], [1525, 85], [1695, 85], [1695, -85]]);
					}
				}
			}
			color(c = [0.5000000000, 0.5000000000, 0.5000000000]) {
				translate(v = [0, 0, 2276.1000000000]) {
					linear_extrude(height = 340.0000000000) {
						polygon(paths = [[0, 1, 2, 3]], points = [[1985, -85], [1985, 85], [2155, 85], [2155, -85]]);
					}
				}
			}
			color(c = [0.5000000000, 0.5000000000, 0.5000000000]) {
				translate(v = [0, 0, 2276.1000000000]) {
					linear_extrude(height = 340.0000000000) {
						polygon(paths = [[0, 1, 2, 3]], points = [[2445, -85], [2445, 85], [2615, 85], [2615, -85]]);
					}
				}
			}
			color(c = [0.5000000000, 0.5000000000, 0.5000000000]) {
				translate(v = [0, 0, 2276.1000000000]) {
					linear_extrude(height = 340.0000000000) {
						polygon(paths = [[0, 1, 2, 3]], points = [[145, 2635], [145, 2805], [315, 2805], [315, 2635]]);
					}
				}
			}
			color(c = [0.5000000000, 0.5000000000, 0.5000000000]) {
				translate(v = [0, 0, 2276.1000000000]) {
					linear_extrude(height = 340.0000000000) {
						polygon(paths = [[0, 1, 2, 3]], points = [[605, 2635], [605, 2805], [775, 2805], [775, 2635]]);
					}
				}
			}
			color(c = [0.5000000000, 0.5000000000, 0.5000000000]) {
				translate(v = [0, 0, 2276.1000000000]) {
					linear_extrude(height = 340.0000000000) {
						polygon(paths = [[0, 1, 2, 3]], points = [[1065, 2635], [1065, 2805], [1235, 2805], [1235, 2635]]);
					}
				}
			}
			color(c = [0.5000000000, 0.5000000000, 0.5000000000]) {
				translate(v = [0, 0, 2276.1000000000]) {
					linear_extrude(height = 340.0000000000) {
						polygon(paths = [[0, 1, 2, 3]], points = [[1525, 2635], [1525, 2805], [1695, 2805], [1695, 2635]]);
					}
				}
			}
			color(c = [0.5000000000, 0.5000000000, 0.5000000000]) {
				translate(v = [0, 0, 2276.1000000000]) {
					linear_extrude(height = 340.0000000000) {
						polygon(paths = [[0, 1, 2, 3]], points = [[1985, 2635], [1985, 2805], [2155, 2805], [2155, 2635]]);
					}
				}
			}
			color(c = [0.5000000000, 0.5000000000, 0.5000000000]) {
				translate(v = [0, 0, 2276.1000000000]) {
					linear_extrude(height = 340.0000000000) {
						polygon(paths = [[0, 1, 2, 3]], points = [[2445, 2635], [2445, 2805], [2615, 2805], [2615, 2635]]);
					}
				}
			}
			color(c = [0.3000000000, 0.3000000000, 1]) {
				translate(v = [0, 0, 2616.1000000000]) {
					linear_extrude(height = 360.0000000000) {
						polygon(paths = [[0, 1, 2, 3]], points = [[0, -240], [0, 240], [2760, 240], [2760, -240]]);
					}
				}
			}
			color(c = [0.3000000000, 0.3000000000, 1]) {
				translate(v = [0, 0, 2616.1000000000]) {
					linear_extrude(height = 360.0000000000) {
						polygon(paths = [[0, 1, 2, 3]], points = [[0, 2480], [0, 2960], [2760, 2960], [2760, 2480]]);
					}
				}
			}
		}
	}
}
